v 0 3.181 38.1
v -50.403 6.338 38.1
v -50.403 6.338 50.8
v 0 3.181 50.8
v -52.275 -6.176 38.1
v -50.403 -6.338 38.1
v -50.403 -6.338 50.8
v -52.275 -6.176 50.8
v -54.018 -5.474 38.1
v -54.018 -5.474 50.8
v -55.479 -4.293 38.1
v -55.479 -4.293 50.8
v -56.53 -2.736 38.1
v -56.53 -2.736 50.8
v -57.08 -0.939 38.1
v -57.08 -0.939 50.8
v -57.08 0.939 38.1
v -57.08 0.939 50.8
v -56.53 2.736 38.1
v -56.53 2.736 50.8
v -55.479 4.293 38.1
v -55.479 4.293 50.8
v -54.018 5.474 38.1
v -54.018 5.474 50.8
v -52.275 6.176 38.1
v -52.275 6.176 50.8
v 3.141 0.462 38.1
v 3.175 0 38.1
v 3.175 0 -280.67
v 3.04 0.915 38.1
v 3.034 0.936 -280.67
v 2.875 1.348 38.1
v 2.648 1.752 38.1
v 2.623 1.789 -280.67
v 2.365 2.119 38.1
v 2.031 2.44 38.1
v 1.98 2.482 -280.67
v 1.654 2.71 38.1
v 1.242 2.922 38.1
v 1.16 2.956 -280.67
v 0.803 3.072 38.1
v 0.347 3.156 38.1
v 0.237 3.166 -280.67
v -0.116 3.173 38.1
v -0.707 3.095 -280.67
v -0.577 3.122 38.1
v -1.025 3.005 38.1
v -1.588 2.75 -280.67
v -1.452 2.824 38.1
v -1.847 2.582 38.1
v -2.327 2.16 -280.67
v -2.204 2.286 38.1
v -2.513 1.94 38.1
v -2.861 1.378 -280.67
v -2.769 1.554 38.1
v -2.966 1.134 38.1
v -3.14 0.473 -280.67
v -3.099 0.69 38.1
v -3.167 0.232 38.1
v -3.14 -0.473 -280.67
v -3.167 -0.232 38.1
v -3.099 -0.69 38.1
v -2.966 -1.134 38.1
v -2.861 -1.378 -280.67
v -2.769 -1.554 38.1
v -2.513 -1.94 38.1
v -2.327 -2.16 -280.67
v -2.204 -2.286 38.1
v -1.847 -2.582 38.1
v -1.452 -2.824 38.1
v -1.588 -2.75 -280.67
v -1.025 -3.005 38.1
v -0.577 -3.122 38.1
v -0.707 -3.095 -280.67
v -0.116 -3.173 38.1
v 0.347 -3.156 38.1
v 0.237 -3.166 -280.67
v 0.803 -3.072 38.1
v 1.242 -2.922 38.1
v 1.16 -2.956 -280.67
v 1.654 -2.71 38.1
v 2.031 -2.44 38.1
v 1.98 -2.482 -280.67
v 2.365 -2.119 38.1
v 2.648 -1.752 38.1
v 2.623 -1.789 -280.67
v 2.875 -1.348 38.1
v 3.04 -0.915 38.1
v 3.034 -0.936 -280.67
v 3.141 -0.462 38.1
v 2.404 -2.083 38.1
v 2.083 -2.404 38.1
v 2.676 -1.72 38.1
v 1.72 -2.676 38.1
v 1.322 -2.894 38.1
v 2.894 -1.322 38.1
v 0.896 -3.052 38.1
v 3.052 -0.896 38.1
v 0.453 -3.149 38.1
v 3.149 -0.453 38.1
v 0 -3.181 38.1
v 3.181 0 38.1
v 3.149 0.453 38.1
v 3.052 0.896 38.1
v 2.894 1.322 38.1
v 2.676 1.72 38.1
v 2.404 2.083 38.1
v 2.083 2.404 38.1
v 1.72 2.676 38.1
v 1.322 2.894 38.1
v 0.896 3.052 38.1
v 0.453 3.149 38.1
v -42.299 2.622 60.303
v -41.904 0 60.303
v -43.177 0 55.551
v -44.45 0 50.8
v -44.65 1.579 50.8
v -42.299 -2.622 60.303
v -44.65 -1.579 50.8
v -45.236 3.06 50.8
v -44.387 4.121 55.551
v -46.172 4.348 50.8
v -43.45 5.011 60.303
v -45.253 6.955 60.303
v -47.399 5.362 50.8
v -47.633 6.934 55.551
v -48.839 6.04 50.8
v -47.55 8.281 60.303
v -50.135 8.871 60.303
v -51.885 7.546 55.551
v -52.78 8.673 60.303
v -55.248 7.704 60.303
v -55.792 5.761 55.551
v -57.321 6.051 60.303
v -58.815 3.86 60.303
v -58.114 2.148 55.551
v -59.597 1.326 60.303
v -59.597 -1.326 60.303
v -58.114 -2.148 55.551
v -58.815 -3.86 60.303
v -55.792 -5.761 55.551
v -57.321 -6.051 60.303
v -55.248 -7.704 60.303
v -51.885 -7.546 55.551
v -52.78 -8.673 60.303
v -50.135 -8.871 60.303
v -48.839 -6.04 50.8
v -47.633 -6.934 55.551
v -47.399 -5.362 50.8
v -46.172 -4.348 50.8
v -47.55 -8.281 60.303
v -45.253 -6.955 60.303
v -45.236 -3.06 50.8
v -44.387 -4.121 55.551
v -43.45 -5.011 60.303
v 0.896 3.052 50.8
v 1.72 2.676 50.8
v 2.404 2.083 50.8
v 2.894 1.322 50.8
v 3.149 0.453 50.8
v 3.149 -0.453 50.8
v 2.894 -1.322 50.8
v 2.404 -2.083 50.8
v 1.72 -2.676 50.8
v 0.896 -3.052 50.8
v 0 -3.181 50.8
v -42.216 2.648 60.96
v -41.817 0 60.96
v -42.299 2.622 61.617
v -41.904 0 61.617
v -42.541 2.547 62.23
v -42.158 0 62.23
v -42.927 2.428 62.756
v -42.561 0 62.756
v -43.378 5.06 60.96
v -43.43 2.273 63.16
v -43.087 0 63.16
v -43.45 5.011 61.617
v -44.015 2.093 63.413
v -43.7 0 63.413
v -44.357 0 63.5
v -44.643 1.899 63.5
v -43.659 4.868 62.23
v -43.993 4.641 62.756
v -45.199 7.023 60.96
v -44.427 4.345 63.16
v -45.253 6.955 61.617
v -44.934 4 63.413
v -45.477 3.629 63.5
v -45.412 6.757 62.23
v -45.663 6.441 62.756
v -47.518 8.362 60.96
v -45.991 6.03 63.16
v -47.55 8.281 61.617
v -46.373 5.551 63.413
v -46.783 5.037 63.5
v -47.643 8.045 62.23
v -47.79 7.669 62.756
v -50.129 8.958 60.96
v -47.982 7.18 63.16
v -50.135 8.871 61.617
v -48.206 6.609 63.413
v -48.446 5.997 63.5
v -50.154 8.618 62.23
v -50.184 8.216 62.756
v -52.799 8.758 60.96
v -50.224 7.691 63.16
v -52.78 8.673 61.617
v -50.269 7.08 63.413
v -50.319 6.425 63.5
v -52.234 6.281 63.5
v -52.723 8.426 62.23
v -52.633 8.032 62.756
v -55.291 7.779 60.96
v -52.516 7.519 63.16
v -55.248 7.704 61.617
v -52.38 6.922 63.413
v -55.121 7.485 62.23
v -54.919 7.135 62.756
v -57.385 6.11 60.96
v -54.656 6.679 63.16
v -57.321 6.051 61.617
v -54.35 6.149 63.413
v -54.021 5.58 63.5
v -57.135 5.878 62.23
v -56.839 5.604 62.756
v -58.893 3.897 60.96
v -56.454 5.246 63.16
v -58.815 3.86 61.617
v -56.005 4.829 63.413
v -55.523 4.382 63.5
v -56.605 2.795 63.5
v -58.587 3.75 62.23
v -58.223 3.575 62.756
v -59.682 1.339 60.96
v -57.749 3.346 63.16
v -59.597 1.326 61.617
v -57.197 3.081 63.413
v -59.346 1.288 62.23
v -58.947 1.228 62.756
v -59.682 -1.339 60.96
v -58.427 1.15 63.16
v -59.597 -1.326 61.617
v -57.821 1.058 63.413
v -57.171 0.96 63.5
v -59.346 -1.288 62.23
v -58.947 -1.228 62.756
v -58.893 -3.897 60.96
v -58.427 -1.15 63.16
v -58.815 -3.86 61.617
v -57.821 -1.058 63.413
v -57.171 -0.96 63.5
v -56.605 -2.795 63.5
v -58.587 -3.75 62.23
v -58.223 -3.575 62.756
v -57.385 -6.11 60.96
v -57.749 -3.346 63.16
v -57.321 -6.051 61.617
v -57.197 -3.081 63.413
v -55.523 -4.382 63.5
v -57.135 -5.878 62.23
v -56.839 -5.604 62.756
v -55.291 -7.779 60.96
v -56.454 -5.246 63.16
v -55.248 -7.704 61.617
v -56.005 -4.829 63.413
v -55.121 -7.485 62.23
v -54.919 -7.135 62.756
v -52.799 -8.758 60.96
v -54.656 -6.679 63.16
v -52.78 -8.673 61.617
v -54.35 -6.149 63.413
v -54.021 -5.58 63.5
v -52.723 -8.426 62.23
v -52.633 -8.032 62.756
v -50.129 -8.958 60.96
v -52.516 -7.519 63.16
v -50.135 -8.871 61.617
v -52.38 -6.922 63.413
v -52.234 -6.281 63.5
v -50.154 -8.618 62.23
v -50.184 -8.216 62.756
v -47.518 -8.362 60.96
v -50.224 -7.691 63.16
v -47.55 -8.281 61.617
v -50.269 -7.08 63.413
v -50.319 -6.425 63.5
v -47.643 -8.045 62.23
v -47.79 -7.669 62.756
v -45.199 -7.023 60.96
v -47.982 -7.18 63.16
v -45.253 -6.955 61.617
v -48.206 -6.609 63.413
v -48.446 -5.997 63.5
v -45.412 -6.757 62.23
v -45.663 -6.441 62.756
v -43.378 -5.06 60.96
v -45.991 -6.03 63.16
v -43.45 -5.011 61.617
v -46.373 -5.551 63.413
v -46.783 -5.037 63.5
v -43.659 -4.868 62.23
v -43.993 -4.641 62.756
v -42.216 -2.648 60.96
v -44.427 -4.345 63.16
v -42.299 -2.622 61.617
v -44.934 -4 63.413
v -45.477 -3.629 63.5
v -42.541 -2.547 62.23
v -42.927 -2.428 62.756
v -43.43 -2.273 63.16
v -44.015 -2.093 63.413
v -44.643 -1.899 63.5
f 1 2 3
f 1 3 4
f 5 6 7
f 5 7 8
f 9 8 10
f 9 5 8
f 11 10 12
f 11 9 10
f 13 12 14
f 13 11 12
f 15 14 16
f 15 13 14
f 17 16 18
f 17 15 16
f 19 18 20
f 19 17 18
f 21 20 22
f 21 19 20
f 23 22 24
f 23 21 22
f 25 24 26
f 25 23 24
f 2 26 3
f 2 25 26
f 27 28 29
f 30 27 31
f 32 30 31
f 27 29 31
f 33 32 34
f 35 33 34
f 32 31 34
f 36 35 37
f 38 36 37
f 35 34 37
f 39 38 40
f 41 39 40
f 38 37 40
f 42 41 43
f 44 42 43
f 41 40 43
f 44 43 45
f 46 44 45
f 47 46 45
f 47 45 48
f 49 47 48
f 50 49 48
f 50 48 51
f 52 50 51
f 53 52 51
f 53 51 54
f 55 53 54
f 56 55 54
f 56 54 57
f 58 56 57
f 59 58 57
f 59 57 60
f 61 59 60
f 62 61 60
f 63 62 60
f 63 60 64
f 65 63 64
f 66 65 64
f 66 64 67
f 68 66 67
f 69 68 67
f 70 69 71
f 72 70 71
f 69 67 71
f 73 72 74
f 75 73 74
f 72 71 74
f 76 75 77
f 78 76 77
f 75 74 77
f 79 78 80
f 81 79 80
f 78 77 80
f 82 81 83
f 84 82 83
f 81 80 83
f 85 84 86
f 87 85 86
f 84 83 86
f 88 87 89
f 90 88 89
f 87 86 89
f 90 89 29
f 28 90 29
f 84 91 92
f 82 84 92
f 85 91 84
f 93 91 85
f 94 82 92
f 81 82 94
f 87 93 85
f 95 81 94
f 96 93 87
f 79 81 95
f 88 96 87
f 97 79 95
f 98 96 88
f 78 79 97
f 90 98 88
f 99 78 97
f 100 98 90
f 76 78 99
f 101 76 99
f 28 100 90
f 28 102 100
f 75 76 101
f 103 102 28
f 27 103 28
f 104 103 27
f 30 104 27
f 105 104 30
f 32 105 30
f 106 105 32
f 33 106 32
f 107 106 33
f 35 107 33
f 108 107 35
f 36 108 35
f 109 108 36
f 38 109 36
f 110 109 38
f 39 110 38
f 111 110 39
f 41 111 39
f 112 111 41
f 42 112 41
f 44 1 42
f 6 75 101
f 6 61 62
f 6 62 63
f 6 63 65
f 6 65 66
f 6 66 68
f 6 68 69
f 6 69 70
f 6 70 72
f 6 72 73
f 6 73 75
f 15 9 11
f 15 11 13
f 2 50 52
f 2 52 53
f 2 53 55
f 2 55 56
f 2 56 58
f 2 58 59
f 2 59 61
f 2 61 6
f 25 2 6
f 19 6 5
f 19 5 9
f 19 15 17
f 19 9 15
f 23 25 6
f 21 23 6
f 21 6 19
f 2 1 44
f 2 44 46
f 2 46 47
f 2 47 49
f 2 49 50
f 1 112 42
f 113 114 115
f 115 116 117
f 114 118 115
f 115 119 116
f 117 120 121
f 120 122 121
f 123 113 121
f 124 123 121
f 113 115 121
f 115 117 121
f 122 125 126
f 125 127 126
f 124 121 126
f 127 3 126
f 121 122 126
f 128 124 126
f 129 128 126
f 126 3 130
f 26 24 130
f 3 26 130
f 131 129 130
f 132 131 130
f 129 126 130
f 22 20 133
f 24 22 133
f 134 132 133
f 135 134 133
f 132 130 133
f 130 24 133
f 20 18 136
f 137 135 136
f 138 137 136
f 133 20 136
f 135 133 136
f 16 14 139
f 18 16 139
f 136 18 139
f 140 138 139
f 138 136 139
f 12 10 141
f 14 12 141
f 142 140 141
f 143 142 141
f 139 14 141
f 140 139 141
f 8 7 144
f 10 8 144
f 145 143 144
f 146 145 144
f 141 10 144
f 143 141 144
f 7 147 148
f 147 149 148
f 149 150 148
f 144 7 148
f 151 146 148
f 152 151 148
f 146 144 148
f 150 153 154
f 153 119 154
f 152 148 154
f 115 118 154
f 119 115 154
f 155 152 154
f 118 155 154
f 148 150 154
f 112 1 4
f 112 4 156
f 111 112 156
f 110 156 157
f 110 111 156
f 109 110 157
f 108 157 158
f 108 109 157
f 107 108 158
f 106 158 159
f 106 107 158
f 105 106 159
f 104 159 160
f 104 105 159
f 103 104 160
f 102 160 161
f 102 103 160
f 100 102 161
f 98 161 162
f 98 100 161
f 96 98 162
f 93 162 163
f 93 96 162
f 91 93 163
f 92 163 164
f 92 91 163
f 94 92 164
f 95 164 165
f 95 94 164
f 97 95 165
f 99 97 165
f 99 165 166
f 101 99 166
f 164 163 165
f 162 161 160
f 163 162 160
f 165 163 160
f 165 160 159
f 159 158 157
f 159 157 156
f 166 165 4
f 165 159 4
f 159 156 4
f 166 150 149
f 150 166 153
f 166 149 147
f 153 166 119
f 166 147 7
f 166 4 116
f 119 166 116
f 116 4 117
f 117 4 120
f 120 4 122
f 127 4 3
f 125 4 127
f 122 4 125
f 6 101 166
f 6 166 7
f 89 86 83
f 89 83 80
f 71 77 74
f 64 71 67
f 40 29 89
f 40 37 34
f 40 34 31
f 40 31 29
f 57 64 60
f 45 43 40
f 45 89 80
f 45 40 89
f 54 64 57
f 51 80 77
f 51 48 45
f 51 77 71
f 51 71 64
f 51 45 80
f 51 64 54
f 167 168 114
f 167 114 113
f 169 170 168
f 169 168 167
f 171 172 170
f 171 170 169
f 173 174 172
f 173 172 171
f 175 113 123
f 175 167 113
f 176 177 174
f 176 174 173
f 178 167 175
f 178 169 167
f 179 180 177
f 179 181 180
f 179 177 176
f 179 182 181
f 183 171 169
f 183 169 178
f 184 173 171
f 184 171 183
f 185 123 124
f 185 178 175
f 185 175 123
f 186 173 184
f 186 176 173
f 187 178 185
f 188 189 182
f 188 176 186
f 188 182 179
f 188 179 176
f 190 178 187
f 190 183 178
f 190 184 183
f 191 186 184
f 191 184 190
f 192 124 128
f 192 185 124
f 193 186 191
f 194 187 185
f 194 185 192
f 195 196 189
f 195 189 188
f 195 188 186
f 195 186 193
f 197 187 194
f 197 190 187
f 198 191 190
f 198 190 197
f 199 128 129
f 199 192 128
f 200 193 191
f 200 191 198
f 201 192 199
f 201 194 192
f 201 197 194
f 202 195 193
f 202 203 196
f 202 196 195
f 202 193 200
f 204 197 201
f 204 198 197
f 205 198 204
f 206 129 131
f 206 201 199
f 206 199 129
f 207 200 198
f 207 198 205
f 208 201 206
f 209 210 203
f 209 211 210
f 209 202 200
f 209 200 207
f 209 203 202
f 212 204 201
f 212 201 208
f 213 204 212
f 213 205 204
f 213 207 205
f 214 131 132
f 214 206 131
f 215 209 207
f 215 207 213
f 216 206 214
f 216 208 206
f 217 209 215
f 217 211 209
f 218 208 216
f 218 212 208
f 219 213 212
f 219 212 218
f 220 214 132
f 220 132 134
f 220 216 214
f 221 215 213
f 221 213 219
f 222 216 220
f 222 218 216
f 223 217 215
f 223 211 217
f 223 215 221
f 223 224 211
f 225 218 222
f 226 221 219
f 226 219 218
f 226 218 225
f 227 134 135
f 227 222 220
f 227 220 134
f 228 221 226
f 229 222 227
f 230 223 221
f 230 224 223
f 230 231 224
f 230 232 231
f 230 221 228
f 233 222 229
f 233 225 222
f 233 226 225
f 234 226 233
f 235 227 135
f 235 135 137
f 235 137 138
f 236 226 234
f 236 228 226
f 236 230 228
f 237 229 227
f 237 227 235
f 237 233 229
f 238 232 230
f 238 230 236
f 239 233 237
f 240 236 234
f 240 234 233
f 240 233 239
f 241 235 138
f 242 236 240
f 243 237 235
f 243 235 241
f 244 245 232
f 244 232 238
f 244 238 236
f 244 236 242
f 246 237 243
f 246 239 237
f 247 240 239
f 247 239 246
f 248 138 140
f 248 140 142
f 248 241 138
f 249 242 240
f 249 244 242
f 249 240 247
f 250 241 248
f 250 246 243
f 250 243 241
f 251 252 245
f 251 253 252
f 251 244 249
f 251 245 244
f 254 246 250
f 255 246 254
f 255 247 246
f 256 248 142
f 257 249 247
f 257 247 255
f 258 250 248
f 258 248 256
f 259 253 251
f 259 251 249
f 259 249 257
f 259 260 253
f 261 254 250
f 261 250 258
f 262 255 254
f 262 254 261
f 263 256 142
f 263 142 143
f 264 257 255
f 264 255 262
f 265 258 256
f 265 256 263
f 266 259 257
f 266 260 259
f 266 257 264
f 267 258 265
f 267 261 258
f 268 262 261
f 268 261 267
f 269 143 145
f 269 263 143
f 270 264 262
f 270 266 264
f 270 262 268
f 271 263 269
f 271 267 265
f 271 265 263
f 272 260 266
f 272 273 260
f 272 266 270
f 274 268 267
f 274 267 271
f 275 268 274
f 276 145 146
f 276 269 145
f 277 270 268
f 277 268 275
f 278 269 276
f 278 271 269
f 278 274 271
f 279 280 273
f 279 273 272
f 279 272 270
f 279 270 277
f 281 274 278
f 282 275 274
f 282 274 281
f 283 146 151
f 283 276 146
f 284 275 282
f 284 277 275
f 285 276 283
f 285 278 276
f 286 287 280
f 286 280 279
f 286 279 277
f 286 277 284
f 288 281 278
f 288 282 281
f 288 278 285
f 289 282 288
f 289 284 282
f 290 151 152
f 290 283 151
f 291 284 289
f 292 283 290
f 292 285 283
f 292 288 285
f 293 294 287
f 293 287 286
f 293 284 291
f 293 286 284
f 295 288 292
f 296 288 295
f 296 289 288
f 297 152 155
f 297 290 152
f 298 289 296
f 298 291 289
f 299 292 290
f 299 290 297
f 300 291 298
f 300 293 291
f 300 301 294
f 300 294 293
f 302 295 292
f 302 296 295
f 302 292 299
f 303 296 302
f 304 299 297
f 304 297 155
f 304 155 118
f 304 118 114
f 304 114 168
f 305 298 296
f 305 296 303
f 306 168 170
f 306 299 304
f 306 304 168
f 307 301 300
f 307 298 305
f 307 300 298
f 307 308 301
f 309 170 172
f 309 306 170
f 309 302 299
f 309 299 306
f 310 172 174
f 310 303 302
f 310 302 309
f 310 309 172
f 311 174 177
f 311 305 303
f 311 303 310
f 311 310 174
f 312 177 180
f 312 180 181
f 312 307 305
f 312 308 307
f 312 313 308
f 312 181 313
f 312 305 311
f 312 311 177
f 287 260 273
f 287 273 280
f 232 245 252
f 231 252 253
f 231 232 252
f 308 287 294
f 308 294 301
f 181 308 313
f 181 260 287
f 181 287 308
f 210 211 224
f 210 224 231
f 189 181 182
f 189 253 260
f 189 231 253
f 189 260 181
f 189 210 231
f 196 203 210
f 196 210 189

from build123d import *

# Parameters (mm, degrees)
BOSS_EXTRUDE1_DEPTH      = 38.1
BOSS_EXTRUDE1_DEPTH_BACK = 312.42
SKETCH1_R                = 3.175
BOSS_EXTRUDE2_DEPTH      = 12.7
SKETCH6_R                = 6.35
BOSS_EXTRUDE3_DEPTH      = 12.7
BOSS_EXTRUDE3_DRAFT      = -15
SKETCH7_R                = 26.162
CUT_EXTRUDE1_DEPTH       = 31.75
FILLET1_R                = 2.54


with BuildPart() as part:
    # Sketch1 → Boss-Extrude1 (new, two sides: drawn at the far end of the back side and taken through both)
    with BuildSketch(Plane.XY.offset(-BOSS_EXTRUDE1_DEPTH_BACK)):
        Circle(SKETCH1_R)
    extrude(amount=BOSS_EXTRUDE1_DEPTH + BOSS_EXTRUDE1_DEPTH_BACK)

    # Sketch5 → Boss-Extrude2 (add)
    with BuildSketch(Plane.XY.offset(38.1)):
        with BuildLine():
            Line((0, -3.181219399), (-50.403125, -6.337585521))
            ThreePointArc((-50.403125, -6.337585521), (-57.15, 0), (-50.403125, 6.337585521))
            Line((-50.403125, 6.337585521), (0, 3.181219399))
            ThreePointArc((0, 3.181219399), (3.181219399, 0), (0, -3.181219399))
        make_face()
    extrude(amount=BOSS_EXTRUDE2_DEPTH)


with BuildPart() as boss_extrude3_tool:
    # Sketch6 → Boss-Extrude3 (with draft: the straight prism first)
    with BuildSketch(Plane.XY.offset(50.8)):
        with Locations((-50.8, 0)):
            Circle(SKETCH6_R)
    extrude(amount=BOSS_EXTRUDE3_DEPTH)
    # Boss-Extrude3: the draft: its side faces are tilted about the plane it starts from
    boss_extrude3_sides = [boss_extrude3_tool.faces().sort_by_distance(p)[0] for p in [
        (-57.15, 0, 57.15),
    ]]
    draft(boss_extrude3_sides, Plane.XY.offset(50.8), BOSS_EXTRUDE3_DRAFT)


with BuildPart() as part_1:
    add(part.part)

    # Boss-Extrude3: add boss_extrude3_tool
    add(boss_extrude3_tool.part)

    # Sketch7 → Cut-Extrude1 (cut)
    with BuildSketch(Plane(origin=(0, 0, -312.42), x_dir=(-1, 0, 0), z_dir=(0, 0, -1))):
        Circle(SKETCH7_R)
    extrude(amount=-CUT_EXTRUDE1_DEPTH, mode=Mode.SUBTRACT)

    # Fillet1
    fillet1_edges = [part_1.edges().sort_by_distance(p)[0] for p in [
        (-60.552954744, 0, 63.5),
    ]]
    fillet(fillet1_edges, radius=FILLET1_R)


solid = part_1.part
